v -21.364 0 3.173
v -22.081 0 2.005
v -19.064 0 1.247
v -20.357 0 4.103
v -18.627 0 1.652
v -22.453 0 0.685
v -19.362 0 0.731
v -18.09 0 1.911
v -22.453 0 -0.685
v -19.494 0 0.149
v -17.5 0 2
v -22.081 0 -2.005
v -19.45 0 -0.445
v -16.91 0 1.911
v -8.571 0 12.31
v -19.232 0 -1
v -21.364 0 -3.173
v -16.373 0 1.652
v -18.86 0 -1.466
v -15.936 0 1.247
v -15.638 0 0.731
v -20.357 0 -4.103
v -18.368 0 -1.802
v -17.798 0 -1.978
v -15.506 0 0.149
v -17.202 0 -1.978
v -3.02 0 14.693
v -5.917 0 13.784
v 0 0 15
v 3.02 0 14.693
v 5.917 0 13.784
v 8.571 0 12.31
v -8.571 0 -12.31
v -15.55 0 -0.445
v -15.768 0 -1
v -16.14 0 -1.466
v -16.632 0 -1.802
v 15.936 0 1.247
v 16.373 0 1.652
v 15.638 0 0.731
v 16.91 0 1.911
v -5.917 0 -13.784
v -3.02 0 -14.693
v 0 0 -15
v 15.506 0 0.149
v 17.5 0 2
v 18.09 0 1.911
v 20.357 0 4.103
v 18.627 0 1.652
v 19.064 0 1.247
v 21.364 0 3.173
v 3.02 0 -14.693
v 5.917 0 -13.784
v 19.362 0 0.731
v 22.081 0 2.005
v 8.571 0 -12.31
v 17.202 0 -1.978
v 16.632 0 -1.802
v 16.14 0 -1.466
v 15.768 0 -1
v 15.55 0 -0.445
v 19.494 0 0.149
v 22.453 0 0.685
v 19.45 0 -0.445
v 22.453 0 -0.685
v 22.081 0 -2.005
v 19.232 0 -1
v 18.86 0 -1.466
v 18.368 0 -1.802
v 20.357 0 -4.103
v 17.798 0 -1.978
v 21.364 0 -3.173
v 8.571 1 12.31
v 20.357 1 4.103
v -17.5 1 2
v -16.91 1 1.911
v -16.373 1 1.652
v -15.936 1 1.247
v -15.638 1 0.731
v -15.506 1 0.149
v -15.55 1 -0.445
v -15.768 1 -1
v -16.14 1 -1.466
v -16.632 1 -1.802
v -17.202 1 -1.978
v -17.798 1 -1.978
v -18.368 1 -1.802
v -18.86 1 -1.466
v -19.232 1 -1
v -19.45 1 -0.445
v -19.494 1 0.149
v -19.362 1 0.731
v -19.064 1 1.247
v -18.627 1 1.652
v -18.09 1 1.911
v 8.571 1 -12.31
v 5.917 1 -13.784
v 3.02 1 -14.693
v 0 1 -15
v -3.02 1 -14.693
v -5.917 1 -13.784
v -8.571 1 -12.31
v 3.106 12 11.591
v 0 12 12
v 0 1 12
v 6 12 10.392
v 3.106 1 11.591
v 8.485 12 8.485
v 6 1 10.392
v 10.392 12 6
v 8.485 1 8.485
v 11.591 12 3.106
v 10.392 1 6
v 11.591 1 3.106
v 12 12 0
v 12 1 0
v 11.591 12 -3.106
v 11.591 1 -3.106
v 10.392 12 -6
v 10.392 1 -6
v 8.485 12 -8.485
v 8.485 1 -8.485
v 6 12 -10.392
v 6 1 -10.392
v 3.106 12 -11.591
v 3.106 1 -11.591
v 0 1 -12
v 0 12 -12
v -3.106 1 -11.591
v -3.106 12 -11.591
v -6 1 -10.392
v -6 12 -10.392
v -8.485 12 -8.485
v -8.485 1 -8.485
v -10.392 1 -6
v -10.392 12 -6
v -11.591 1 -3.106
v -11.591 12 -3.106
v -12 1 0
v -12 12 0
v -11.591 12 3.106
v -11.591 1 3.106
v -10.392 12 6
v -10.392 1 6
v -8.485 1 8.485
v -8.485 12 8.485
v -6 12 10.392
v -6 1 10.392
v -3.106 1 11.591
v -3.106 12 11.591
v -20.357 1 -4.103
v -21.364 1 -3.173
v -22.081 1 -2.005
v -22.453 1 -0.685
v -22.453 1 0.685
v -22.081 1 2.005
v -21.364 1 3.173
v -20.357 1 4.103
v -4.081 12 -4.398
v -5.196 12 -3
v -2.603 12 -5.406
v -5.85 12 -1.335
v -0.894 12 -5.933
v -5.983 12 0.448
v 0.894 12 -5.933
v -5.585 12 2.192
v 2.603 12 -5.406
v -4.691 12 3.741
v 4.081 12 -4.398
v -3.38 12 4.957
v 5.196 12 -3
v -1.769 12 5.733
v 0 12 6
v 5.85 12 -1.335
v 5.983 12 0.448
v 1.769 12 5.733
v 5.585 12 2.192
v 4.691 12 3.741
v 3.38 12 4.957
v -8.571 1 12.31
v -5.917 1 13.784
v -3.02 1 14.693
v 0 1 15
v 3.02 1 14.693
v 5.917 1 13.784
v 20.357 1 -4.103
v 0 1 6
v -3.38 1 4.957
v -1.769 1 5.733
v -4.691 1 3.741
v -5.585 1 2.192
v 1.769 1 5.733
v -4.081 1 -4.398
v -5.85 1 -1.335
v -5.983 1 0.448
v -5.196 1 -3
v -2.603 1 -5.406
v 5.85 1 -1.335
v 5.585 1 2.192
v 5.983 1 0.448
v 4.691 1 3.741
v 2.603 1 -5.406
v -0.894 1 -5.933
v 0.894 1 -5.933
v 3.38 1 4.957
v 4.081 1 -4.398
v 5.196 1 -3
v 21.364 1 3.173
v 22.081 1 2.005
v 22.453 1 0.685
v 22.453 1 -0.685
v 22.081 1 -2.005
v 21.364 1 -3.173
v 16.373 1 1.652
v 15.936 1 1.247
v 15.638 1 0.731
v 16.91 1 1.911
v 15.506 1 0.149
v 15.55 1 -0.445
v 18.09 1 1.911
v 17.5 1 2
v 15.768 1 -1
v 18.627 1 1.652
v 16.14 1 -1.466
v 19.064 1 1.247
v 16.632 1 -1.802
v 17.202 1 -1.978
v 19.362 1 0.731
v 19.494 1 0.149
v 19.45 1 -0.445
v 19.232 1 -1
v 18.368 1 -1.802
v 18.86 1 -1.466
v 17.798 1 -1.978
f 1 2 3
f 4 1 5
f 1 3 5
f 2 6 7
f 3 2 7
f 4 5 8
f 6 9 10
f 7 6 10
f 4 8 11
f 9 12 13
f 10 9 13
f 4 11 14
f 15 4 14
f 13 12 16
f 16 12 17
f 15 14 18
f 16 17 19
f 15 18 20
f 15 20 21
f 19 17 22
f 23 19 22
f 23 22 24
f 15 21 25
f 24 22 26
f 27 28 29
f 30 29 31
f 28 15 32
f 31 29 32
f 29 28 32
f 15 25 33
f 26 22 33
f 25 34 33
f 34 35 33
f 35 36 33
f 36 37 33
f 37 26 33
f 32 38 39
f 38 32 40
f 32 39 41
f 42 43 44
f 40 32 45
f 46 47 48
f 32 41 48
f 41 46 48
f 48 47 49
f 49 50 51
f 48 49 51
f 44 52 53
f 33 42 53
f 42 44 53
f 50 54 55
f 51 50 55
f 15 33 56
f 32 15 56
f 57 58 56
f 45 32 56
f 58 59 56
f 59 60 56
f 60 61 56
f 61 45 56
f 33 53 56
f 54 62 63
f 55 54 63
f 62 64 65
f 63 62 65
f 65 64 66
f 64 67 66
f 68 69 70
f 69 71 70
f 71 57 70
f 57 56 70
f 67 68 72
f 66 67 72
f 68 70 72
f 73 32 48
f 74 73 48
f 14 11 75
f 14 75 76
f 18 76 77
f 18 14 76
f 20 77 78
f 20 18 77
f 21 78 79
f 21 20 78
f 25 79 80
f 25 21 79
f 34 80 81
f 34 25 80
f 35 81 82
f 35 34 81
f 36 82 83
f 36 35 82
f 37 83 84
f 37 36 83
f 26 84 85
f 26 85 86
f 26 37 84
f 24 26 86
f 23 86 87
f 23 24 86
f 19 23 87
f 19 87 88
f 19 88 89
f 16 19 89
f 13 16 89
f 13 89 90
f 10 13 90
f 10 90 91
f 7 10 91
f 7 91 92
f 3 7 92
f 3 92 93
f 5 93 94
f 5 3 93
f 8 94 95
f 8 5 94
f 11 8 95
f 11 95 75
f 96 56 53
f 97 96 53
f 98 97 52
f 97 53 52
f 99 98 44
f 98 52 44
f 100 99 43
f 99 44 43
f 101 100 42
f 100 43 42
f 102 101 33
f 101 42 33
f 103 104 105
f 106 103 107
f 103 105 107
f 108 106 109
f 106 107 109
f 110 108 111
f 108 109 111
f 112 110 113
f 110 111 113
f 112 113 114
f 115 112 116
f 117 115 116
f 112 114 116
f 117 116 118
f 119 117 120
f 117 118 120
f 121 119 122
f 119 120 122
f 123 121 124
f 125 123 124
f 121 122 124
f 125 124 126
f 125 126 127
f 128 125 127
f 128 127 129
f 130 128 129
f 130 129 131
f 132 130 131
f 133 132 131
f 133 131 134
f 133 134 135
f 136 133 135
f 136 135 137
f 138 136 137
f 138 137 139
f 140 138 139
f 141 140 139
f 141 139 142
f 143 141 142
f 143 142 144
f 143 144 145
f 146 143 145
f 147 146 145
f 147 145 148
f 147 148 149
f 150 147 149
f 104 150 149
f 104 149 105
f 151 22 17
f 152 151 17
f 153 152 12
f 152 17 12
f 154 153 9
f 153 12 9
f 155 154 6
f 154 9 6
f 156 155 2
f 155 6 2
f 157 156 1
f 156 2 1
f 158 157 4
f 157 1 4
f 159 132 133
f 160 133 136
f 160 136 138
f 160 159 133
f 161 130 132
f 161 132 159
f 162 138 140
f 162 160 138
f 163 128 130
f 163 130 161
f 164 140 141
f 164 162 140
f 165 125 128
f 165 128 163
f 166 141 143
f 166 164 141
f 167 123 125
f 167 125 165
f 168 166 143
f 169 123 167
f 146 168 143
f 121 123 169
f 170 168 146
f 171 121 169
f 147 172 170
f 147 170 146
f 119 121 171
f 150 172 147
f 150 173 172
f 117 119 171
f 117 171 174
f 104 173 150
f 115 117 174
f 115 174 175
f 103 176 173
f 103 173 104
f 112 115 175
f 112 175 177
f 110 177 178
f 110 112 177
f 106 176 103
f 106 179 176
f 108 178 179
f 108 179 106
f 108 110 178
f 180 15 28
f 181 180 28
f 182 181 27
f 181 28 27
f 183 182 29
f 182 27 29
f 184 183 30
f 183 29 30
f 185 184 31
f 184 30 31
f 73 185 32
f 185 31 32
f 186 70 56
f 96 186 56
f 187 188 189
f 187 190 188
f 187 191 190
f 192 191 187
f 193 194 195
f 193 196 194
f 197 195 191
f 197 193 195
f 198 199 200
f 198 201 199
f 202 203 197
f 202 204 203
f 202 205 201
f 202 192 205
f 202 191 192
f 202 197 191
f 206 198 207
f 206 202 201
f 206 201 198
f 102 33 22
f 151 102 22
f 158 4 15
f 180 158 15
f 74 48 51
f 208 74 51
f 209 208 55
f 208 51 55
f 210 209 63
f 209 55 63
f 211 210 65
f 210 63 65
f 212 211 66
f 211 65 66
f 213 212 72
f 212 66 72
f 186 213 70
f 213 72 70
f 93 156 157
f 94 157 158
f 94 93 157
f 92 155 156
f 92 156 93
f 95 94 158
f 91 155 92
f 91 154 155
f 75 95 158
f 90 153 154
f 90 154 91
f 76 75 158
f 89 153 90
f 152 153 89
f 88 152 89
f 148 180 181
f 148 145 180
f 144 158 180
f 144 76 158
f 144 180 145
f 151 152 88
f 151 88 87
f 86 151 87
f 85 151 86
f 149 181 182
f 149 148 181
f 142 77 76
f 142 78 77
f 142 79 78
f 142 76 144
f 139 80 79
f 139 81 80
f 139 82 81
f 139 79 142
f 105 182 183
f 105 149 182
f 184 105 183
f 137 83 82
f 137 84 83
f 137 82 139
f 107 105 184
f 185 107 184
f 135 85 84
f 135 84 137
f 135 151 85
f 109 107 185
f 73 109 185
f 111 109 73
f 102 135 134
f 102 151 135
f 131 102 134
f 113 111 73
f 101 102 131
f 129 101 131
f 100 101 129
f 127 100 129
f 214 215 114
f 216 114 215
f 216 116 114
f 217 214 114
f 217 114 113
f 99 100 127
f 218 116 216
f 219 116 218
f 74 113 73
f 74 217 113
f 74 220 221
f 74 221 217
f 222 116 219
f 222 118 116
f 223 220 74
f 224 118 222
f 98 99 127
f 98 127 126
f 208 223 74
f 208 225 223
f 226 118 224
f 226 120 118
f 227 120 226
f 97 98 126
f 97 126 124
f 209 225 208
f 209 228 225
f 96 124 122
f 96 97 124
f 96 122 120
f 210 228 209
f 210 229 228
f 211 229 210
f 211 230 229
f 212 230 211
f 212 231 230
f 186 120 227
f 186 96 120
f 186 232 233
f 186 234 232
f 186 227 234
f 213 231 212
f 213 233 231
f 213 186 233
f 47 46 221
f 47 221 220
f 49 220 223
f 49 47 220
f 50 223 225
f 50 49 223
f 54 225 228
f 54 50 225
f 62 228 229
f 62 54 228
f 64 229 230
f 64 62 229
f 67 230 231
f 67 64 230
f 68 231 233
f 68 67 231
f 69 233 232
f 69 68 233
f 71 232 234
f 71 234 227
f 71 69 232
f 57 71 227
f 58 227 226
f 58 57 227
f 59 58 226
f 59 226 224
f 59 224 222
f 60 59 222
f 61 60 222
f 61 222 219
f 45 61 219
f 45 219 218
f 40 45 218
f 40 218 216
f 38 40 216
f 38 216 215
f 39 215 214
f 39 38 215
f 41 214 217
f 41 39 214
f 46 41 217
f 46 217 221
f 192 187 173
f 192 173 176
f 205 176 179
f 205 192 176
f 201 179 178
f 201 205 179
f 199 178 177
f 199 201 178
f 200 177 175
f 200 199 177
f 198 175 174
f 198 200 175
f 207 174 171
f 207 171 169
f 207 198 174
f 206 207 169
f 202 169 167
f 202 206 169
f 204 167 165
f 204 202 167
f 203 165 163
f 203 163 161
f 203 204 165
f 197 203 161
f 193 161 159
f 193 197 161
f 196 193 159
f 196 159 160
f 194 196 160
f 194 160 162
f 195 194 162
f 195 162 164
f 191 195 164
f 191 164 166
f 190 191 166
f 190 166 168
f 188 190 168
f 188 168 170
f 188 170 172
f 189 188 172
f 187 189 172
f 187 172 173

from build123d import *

# Parameters (mm, degrees)
SKETCH_1_R      = 2
EXTRUDE_1_DEPTH = 1
SKETCH_1_3_R    = 12
SKETCH_1_3_R_2  = 6
EXTRUDE_2_DEPTH = 12


with BuildPart() as part:
    # 草图1 → 凸台-拉伸1 (new body)
    with BuildSketch(Plane(origin=(0, 0, 0), x_dir=(1, 0, 0), z_dir=(0, 1, 0))):
        with BuildLine():
            ThreePointArc((-8.571428571, -12.3097771), (0, -15), (8.571428571, -12.3097771))
            Line((8.571428571, -12.3097771), (20.357142857, -4.103259033))
            ThreePointArc((20.357142857, -4.103259033), (22.5, 0), (20.357142857, 4.103259033))
            Line((20.357142857, 4.103259033), (8.571428571, 12.3097771))
            ThreePointArc((8.571428571, 12.3097771), (0, 15), (-8.571428571, 12.3097771))
            Line((-8.571428571, 12.3097771), (-20.357142857, 4.103259033))
            ThreePointArc((-20.357142857, 4.103259033), (-22.5, 0), (-20.357142857, -4.103259033))
            Line((-20.357142857, -4.103259033), (-8.571428571, -12.3097771))
        make_face()
        with Locations((17.5, 0)):
            Circle(SKETCH_1_R, mode=Mode.SUBTRACT)
        with Locations((-17.5, 0)):
            Circle(SKETCH_1_R, mode=Mode.SUBTRACT)
    extrude(amount=EXTRUDE_1_DEPTH)

    # 草图1<3> → 凸台-拉伸2 (add)
    with BuildSketch(Plane(origin=(0, 0, 0), x_dir=(1, 0, 0), z_dir=(0, 1, 0))):
        Circle(SKETCH_1_3_R)
        Circle(SKETCH_1_3_R_2, mode=Mode.SUBTRACT)
    extrude(amount=EXTRUDE_2_DEPTH)


solid = part.part
